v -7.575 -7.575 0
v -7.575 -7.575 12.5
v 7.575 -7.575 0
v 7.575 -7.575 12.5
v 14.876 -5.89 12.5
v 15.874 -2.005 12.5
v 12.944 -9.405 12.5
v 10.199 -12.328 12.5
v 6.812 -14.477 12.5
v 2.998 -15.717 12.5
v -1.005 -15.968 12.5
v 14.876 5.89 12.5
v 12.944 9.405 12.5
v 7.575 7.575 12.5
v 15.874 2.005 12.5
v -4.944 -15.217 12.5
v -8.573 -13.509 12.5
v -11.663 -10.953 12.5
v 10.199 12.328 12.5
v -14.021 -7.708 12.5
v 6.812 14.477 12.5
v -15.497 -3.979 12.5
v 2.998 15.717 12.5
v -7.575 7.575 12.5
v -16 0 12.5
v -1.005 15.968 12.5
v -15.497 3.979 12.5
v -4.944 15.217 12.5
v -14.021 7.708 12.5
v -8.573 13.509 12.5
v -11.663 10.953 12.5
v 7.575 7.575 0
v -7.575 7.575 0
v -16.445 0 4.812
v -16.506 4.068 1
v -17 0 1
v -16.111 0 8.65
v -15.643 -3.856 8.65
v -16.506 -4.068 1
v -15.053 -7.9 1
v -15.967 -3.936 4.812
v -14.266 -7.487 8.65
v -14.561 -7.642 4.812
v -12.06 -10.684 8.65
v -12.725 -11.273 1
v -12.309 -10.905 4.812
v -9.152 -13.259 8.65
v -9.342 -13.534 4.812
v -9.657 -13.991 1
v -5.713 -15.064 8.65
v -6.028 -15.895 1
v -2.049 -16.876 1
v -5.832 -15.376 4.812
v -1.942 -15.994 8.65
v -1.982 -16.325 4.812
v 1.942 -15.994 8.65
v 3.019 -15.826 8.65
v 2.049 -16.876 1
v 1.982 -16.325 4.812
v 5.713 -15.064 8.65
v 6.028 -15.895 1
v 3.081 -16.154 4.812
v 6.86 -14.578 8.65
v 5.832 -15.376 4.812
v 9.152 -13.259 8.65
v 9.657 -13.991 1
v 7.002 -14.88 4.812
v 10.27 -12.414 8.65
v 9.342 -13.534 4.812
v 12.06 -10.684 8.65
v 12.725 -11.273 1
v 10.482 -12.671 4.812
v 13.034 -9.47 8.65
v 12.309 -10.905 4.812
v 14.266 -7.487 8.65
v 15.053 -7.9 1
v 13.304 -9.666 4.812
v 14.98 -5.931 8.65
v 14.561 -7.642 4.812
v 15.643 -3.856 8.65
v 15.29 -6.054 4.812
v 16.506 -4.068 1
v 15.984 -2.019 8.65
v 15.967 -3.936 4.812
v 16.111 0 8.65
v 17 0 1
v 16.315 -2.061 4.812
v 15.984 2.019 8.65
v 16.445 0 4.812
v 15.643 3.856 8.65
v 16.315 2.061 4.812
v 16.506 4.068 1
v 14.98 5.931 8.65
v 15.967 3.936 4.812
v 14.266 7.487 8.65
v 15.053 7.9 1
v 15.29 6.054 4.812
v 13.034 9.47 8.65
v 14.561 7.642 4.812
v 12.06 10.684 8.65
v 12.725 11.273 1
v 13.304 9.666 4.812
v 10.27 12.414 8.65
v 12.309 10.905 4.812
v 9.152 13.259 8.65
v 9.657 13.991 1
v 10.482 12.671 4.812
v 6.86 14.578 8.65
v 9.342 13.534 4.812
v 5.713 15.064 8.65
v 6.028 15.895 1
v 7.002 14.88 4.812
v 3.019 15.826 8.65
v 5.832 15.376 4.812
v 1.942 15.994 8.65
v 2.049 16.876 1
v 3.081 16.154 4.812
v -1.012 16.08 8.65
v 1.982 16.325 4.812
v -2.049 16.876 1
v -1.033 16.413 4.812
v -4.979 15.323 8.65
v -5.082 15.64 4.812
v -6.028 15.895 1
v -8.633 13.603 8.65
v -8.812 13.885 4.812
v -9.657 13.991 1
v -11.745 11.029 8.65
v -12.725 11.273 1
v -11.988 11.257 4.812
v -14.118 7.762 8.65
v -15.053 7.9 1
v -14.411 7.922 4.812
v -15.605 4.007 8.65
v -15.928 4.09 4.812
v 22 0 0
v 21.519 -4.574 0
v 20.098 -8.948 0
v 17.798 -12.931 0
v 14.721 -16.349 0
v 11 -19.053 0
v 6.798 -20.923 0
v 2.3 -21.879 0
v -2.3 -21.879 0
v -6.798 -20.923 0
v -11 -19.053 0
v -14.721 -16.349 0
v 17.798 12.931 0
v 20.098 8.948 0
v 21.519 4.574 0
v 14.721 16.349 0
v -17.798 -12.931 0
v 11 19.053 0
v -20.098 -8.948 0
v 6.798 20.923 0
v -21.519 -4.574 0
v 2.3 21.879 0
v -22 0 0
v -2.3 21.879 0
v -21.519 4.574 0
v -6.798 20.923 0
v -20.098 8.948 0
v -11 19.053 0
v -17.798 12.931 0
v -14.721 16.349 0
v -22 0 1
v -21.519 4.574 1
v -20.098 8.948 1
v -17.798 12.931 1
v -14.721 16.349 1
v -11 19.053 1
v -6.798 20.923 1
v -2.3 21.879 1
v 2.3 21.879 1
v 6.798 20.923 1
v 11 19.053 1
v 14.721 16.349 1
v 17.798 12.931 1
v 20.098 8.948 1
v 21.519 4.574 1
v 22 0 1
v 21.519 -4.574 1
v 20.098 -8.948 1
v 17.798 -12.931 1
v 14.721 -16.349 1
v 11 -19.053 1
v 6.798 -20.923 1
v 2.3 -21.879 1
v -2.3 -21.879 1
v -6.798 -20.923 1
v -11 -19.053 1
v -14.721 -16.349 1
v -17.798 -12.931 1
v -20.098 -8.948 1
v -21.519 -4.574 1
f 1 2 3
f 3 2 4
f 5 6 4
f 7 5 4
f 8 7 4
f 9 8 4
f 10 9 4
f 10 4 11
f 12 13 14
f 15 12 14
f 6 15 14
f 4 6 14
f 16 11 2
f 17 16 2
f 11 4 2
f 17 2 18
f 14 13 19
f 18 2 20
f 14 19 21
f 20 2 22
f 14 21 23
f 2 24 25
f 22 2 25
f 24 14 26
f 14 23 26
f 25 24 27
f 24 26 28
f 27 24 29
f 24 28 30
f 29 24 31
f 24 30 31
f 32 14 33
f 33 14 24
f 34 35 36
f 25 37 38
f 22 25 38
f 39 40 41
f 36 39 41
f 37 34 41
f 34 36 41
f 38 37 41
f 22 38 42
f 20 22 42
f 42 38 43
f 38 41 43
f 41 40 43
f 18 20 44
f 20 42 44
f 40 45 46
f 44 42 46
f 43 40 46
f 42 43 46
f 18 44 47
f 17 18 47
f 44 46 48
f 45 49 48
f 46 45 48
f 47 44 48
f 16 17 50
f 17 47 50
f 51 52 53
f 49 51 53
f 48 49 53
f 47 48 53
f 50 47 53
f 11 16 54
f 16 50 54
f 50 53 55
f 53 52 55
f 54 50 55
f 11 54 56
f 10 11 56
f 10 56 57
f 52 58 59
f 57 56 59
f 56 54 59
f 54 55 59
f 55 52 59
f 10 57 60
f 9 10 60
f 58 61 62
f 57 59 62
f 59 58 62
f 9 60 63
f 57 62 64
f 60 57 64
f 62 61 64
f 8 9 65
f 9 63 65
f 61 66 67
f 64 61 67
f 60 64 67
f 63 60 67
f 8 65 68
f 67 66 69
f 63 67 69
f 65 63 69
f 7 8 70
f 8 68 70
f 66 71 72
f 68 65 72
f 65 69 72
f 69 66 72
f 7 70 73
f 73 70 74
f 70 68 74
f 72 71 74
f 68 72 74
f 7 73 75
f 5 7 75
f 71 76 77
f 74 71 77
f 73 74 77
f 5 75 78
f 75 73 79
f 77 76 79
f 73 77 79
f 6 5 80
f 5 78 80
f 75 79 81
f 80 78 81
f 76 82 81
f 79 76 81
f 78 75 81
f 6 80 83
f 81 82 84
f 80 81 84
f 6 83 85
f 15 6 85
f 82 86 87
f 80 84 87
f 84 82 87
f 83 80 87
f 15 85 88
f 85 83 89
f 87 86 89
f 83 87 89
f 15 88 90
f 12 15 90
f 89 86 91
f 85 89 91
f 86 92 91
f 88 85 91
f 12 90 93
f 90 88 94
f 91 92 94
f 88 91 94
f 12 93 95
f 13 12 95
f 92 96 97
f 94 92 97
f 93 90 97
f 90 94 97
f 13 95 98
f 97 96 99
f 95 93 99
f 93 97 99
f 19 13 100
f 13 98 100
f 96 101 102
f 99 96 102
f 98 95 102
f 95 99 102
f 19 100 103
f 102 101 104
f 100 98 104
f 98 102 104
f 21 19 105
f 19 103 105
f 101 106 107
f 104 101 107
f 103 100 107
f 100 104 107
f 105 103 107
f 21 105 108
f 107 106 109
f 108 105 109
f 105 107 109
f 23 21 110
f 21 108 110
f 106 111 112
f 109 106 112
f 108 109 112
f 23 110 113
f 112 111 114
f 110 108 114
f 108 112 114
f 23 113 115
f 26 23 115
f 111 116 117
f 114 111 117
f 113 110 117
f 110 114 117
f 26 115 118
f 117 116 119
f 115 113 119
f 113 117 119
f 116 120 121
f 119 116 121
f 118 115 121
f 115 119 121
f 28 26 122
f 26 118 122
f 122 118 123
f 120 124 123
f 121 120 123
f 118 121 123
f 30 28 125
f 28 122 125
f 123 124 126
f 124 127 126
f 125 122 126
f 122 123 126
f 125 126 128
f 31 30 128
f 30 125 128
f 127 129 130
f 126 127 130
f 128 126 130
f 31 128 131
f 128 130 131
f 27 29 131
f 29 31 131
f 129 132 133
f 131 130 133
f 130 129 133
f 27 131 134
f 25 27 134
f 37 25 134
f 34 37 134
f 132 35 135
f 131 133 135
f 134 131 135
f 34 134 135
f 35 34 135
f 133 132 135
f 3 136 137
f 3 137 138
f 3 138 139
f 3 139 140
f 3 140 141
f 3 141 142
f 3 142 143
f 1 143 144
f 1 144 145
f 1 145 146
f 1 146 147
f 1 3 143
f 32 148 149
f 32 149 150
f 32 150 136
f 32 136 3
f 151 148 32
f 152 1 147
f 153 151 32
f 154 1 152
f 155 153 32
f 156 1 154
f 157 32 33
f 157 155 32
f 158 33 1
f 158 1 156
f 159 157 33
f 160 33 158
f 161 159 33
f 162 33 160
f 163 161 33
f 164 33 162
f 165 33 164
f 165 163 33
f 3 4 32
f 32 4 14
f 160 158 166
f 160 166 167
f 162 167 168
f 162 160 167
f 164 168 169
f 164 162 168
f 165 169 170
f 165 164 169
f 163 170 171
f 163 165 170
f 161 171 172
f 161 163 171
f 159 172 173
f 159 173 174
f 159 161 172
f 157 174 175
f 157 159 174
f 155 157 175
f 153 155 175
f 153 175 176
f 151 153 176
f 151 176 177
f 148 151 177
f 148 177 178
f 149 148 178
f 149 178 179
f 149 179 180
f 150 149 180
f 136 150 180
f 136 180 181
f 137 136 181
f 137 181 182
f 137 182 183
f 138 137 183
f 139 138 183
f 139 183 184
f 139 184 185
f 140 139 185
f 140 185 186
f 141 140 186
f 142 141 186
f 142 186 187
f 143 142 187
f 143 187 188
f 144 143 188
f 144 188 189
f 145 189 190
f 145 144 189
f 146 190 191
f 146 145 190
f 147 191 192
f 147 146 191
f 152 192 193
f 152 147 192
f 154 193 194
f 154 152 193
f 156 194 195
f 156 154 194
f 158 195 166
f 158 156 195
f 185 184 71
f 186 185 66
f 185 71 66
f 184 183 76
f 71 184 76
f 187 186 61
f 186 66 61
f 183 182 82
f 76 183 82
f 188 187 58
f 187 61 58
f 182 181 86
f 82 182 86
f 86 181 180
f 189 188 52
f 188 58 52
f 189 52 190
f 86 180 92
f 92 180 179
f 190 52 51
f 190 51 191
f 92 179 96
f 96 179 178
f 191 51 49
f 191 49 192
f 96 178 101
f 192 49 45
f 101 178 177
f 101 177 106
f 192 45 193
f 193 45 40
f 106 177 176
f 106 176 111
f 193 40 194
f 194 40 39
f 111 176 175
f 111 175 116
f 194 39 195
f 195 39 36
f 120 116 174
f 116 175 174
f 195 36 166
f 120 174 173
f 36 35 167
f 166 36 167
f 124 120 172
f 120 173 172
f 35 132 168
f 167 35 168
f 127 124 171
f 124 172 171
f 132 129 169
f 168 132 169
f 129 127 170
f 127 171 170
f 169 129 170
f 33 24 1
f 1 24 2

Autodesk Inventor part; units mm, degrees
ref_plane "YZ Plane" through (0, 0, 0) normal (1, 0, 0) x (0, 1, 0)
ref_plane "XZ Plane" through (0, 0, 0) normal (0, 1, 0) x (-1, 0, 0)
ref_plane "XY Plane" through (0, 0, 0) normal (0, 0, 1) x (1, 0, 0)
sketch "Skizze1" plane through (0, 0, 0) normal (0, 1, 0) x (-1, 0, 0)
  line L0 (17, 1) -> (22, 1)
  line L1 (22, 1) -> (22, 0)
  line L2 (22, 0) -> (0, 0)
  line L3 (0, 12.5) -> (0, 0)
  line L4 (99.15, 0) -> (-16.525, 0) projected
  line L5 (0, -2.5) -> (0, 15) projected
  line L6 (16, 12.5) -> (0, 12.5)
  arc A0 (16, 12.5) -> (17, 1) centre (82.625, 12.5) ccw
  line L7 (16, 12.5) -> (16, 0) construction
  dimension "d6" = 12.5
  dimension "d7" = 1
  dimension "d15" = 16
  dimension "d16" = 17
  dimension "d21" = 22
revolve "Umdrehung1" add sketch "Skizze1" angle 360 about axis through (0, 0, 12.5) along (0, 0, -1)
sketch "Skizze3" plane through (0, 0, 12.5) normal (0, 0, 1) x (1, 0, 0)
  circle A0 centre (0, 0) radius 22 projected
  circle A1 centre (0, 0) radius 5.075
  dimension "d8" = 10.15
extrude "Extrusion2" cut sketch "Skizze3" against normal through all contours A1
sketch "Skizze4" plane through (0, 0, 12.5) normal (0, 0, 1) x (1, 0, 0)
  circle A0 centre (0, 0) radius 5.075 projected
  circle A1 centre (0, 0) radius 16 projected
  line L0 (-7.575, -7.575) -> (7.575, -7.575)
  line L1 (7.575, -7.575) -> (7.575, 7.575)
  line L2 (7.575, 7.575) -> (-7.575, 7.575)
  line L3 (-7.575, 7.575) -> (-7.575, -7.575)
  line L4 (-7.575, -7.575) -> (7.575, 7.575) construction
  line L5 (7.575, -7.575) -> (-7.575, 7.575) construction
  dimension "d11" = 15.15
  dimension "d12" = 15.15
extrude "Extrusion3" cut sketch "Skizze4" against normal blind 2.2 contours L3 L2 L1 L0
sketch "Skizze5" plane through (0, 0, 0) normal (0, 0, -1) x (-1, 0, 0)
  circle A0 centre (0, 0) radius 5.075 projected
  circle A1 centre (0, 0) radius 22 projected
  line L0 (-7.575, -7.575) -> (7.575, -7.575)
  line L1 (7.575, -7.575) -> (7.575, 7.575)
  line L2 (7.575, 7.575) -> (-7.575, 7.575)
  line L3 (-7.575, 7.575) -> (-7.575, -7.575)
  line L4 (-7.575, -7.575) -> (7.575, 7.575) construction
  line L5 (7.575, -7.575) -> (-7.575, 7.575) construction
  dimension "d17" = 15.15
  dimension "d18" = 15.15
extrude "Extrusion4" cut sketch "Skizze5" against normal blind 2.5 contours L3 L2 L1 L0
sketch "Skizze6" plane through (0, 0, 10.3) normal (0, 0, 1) x (1, 0, 0)
  line L0 (7.575, 7.575) -> (7.575, -7.575) projected
  line L1 (-7.575, 7.575) -> (7.575, 7.575) projected
  line L2 (-7.575, -7.575) -> (-7.575, 7.575) projected
  line L3 (7.575, -7.575) -> (-7.575, -7.575) projected
  circle A0 centre (0, 0) radius 5.075 projected
extrude "Extrusion5" cut sketch "Skizze6" against normal through all
properties part number "Seil_Rolle_Antrieb_Mitte" material "PC/ABS-Kunststoff"
